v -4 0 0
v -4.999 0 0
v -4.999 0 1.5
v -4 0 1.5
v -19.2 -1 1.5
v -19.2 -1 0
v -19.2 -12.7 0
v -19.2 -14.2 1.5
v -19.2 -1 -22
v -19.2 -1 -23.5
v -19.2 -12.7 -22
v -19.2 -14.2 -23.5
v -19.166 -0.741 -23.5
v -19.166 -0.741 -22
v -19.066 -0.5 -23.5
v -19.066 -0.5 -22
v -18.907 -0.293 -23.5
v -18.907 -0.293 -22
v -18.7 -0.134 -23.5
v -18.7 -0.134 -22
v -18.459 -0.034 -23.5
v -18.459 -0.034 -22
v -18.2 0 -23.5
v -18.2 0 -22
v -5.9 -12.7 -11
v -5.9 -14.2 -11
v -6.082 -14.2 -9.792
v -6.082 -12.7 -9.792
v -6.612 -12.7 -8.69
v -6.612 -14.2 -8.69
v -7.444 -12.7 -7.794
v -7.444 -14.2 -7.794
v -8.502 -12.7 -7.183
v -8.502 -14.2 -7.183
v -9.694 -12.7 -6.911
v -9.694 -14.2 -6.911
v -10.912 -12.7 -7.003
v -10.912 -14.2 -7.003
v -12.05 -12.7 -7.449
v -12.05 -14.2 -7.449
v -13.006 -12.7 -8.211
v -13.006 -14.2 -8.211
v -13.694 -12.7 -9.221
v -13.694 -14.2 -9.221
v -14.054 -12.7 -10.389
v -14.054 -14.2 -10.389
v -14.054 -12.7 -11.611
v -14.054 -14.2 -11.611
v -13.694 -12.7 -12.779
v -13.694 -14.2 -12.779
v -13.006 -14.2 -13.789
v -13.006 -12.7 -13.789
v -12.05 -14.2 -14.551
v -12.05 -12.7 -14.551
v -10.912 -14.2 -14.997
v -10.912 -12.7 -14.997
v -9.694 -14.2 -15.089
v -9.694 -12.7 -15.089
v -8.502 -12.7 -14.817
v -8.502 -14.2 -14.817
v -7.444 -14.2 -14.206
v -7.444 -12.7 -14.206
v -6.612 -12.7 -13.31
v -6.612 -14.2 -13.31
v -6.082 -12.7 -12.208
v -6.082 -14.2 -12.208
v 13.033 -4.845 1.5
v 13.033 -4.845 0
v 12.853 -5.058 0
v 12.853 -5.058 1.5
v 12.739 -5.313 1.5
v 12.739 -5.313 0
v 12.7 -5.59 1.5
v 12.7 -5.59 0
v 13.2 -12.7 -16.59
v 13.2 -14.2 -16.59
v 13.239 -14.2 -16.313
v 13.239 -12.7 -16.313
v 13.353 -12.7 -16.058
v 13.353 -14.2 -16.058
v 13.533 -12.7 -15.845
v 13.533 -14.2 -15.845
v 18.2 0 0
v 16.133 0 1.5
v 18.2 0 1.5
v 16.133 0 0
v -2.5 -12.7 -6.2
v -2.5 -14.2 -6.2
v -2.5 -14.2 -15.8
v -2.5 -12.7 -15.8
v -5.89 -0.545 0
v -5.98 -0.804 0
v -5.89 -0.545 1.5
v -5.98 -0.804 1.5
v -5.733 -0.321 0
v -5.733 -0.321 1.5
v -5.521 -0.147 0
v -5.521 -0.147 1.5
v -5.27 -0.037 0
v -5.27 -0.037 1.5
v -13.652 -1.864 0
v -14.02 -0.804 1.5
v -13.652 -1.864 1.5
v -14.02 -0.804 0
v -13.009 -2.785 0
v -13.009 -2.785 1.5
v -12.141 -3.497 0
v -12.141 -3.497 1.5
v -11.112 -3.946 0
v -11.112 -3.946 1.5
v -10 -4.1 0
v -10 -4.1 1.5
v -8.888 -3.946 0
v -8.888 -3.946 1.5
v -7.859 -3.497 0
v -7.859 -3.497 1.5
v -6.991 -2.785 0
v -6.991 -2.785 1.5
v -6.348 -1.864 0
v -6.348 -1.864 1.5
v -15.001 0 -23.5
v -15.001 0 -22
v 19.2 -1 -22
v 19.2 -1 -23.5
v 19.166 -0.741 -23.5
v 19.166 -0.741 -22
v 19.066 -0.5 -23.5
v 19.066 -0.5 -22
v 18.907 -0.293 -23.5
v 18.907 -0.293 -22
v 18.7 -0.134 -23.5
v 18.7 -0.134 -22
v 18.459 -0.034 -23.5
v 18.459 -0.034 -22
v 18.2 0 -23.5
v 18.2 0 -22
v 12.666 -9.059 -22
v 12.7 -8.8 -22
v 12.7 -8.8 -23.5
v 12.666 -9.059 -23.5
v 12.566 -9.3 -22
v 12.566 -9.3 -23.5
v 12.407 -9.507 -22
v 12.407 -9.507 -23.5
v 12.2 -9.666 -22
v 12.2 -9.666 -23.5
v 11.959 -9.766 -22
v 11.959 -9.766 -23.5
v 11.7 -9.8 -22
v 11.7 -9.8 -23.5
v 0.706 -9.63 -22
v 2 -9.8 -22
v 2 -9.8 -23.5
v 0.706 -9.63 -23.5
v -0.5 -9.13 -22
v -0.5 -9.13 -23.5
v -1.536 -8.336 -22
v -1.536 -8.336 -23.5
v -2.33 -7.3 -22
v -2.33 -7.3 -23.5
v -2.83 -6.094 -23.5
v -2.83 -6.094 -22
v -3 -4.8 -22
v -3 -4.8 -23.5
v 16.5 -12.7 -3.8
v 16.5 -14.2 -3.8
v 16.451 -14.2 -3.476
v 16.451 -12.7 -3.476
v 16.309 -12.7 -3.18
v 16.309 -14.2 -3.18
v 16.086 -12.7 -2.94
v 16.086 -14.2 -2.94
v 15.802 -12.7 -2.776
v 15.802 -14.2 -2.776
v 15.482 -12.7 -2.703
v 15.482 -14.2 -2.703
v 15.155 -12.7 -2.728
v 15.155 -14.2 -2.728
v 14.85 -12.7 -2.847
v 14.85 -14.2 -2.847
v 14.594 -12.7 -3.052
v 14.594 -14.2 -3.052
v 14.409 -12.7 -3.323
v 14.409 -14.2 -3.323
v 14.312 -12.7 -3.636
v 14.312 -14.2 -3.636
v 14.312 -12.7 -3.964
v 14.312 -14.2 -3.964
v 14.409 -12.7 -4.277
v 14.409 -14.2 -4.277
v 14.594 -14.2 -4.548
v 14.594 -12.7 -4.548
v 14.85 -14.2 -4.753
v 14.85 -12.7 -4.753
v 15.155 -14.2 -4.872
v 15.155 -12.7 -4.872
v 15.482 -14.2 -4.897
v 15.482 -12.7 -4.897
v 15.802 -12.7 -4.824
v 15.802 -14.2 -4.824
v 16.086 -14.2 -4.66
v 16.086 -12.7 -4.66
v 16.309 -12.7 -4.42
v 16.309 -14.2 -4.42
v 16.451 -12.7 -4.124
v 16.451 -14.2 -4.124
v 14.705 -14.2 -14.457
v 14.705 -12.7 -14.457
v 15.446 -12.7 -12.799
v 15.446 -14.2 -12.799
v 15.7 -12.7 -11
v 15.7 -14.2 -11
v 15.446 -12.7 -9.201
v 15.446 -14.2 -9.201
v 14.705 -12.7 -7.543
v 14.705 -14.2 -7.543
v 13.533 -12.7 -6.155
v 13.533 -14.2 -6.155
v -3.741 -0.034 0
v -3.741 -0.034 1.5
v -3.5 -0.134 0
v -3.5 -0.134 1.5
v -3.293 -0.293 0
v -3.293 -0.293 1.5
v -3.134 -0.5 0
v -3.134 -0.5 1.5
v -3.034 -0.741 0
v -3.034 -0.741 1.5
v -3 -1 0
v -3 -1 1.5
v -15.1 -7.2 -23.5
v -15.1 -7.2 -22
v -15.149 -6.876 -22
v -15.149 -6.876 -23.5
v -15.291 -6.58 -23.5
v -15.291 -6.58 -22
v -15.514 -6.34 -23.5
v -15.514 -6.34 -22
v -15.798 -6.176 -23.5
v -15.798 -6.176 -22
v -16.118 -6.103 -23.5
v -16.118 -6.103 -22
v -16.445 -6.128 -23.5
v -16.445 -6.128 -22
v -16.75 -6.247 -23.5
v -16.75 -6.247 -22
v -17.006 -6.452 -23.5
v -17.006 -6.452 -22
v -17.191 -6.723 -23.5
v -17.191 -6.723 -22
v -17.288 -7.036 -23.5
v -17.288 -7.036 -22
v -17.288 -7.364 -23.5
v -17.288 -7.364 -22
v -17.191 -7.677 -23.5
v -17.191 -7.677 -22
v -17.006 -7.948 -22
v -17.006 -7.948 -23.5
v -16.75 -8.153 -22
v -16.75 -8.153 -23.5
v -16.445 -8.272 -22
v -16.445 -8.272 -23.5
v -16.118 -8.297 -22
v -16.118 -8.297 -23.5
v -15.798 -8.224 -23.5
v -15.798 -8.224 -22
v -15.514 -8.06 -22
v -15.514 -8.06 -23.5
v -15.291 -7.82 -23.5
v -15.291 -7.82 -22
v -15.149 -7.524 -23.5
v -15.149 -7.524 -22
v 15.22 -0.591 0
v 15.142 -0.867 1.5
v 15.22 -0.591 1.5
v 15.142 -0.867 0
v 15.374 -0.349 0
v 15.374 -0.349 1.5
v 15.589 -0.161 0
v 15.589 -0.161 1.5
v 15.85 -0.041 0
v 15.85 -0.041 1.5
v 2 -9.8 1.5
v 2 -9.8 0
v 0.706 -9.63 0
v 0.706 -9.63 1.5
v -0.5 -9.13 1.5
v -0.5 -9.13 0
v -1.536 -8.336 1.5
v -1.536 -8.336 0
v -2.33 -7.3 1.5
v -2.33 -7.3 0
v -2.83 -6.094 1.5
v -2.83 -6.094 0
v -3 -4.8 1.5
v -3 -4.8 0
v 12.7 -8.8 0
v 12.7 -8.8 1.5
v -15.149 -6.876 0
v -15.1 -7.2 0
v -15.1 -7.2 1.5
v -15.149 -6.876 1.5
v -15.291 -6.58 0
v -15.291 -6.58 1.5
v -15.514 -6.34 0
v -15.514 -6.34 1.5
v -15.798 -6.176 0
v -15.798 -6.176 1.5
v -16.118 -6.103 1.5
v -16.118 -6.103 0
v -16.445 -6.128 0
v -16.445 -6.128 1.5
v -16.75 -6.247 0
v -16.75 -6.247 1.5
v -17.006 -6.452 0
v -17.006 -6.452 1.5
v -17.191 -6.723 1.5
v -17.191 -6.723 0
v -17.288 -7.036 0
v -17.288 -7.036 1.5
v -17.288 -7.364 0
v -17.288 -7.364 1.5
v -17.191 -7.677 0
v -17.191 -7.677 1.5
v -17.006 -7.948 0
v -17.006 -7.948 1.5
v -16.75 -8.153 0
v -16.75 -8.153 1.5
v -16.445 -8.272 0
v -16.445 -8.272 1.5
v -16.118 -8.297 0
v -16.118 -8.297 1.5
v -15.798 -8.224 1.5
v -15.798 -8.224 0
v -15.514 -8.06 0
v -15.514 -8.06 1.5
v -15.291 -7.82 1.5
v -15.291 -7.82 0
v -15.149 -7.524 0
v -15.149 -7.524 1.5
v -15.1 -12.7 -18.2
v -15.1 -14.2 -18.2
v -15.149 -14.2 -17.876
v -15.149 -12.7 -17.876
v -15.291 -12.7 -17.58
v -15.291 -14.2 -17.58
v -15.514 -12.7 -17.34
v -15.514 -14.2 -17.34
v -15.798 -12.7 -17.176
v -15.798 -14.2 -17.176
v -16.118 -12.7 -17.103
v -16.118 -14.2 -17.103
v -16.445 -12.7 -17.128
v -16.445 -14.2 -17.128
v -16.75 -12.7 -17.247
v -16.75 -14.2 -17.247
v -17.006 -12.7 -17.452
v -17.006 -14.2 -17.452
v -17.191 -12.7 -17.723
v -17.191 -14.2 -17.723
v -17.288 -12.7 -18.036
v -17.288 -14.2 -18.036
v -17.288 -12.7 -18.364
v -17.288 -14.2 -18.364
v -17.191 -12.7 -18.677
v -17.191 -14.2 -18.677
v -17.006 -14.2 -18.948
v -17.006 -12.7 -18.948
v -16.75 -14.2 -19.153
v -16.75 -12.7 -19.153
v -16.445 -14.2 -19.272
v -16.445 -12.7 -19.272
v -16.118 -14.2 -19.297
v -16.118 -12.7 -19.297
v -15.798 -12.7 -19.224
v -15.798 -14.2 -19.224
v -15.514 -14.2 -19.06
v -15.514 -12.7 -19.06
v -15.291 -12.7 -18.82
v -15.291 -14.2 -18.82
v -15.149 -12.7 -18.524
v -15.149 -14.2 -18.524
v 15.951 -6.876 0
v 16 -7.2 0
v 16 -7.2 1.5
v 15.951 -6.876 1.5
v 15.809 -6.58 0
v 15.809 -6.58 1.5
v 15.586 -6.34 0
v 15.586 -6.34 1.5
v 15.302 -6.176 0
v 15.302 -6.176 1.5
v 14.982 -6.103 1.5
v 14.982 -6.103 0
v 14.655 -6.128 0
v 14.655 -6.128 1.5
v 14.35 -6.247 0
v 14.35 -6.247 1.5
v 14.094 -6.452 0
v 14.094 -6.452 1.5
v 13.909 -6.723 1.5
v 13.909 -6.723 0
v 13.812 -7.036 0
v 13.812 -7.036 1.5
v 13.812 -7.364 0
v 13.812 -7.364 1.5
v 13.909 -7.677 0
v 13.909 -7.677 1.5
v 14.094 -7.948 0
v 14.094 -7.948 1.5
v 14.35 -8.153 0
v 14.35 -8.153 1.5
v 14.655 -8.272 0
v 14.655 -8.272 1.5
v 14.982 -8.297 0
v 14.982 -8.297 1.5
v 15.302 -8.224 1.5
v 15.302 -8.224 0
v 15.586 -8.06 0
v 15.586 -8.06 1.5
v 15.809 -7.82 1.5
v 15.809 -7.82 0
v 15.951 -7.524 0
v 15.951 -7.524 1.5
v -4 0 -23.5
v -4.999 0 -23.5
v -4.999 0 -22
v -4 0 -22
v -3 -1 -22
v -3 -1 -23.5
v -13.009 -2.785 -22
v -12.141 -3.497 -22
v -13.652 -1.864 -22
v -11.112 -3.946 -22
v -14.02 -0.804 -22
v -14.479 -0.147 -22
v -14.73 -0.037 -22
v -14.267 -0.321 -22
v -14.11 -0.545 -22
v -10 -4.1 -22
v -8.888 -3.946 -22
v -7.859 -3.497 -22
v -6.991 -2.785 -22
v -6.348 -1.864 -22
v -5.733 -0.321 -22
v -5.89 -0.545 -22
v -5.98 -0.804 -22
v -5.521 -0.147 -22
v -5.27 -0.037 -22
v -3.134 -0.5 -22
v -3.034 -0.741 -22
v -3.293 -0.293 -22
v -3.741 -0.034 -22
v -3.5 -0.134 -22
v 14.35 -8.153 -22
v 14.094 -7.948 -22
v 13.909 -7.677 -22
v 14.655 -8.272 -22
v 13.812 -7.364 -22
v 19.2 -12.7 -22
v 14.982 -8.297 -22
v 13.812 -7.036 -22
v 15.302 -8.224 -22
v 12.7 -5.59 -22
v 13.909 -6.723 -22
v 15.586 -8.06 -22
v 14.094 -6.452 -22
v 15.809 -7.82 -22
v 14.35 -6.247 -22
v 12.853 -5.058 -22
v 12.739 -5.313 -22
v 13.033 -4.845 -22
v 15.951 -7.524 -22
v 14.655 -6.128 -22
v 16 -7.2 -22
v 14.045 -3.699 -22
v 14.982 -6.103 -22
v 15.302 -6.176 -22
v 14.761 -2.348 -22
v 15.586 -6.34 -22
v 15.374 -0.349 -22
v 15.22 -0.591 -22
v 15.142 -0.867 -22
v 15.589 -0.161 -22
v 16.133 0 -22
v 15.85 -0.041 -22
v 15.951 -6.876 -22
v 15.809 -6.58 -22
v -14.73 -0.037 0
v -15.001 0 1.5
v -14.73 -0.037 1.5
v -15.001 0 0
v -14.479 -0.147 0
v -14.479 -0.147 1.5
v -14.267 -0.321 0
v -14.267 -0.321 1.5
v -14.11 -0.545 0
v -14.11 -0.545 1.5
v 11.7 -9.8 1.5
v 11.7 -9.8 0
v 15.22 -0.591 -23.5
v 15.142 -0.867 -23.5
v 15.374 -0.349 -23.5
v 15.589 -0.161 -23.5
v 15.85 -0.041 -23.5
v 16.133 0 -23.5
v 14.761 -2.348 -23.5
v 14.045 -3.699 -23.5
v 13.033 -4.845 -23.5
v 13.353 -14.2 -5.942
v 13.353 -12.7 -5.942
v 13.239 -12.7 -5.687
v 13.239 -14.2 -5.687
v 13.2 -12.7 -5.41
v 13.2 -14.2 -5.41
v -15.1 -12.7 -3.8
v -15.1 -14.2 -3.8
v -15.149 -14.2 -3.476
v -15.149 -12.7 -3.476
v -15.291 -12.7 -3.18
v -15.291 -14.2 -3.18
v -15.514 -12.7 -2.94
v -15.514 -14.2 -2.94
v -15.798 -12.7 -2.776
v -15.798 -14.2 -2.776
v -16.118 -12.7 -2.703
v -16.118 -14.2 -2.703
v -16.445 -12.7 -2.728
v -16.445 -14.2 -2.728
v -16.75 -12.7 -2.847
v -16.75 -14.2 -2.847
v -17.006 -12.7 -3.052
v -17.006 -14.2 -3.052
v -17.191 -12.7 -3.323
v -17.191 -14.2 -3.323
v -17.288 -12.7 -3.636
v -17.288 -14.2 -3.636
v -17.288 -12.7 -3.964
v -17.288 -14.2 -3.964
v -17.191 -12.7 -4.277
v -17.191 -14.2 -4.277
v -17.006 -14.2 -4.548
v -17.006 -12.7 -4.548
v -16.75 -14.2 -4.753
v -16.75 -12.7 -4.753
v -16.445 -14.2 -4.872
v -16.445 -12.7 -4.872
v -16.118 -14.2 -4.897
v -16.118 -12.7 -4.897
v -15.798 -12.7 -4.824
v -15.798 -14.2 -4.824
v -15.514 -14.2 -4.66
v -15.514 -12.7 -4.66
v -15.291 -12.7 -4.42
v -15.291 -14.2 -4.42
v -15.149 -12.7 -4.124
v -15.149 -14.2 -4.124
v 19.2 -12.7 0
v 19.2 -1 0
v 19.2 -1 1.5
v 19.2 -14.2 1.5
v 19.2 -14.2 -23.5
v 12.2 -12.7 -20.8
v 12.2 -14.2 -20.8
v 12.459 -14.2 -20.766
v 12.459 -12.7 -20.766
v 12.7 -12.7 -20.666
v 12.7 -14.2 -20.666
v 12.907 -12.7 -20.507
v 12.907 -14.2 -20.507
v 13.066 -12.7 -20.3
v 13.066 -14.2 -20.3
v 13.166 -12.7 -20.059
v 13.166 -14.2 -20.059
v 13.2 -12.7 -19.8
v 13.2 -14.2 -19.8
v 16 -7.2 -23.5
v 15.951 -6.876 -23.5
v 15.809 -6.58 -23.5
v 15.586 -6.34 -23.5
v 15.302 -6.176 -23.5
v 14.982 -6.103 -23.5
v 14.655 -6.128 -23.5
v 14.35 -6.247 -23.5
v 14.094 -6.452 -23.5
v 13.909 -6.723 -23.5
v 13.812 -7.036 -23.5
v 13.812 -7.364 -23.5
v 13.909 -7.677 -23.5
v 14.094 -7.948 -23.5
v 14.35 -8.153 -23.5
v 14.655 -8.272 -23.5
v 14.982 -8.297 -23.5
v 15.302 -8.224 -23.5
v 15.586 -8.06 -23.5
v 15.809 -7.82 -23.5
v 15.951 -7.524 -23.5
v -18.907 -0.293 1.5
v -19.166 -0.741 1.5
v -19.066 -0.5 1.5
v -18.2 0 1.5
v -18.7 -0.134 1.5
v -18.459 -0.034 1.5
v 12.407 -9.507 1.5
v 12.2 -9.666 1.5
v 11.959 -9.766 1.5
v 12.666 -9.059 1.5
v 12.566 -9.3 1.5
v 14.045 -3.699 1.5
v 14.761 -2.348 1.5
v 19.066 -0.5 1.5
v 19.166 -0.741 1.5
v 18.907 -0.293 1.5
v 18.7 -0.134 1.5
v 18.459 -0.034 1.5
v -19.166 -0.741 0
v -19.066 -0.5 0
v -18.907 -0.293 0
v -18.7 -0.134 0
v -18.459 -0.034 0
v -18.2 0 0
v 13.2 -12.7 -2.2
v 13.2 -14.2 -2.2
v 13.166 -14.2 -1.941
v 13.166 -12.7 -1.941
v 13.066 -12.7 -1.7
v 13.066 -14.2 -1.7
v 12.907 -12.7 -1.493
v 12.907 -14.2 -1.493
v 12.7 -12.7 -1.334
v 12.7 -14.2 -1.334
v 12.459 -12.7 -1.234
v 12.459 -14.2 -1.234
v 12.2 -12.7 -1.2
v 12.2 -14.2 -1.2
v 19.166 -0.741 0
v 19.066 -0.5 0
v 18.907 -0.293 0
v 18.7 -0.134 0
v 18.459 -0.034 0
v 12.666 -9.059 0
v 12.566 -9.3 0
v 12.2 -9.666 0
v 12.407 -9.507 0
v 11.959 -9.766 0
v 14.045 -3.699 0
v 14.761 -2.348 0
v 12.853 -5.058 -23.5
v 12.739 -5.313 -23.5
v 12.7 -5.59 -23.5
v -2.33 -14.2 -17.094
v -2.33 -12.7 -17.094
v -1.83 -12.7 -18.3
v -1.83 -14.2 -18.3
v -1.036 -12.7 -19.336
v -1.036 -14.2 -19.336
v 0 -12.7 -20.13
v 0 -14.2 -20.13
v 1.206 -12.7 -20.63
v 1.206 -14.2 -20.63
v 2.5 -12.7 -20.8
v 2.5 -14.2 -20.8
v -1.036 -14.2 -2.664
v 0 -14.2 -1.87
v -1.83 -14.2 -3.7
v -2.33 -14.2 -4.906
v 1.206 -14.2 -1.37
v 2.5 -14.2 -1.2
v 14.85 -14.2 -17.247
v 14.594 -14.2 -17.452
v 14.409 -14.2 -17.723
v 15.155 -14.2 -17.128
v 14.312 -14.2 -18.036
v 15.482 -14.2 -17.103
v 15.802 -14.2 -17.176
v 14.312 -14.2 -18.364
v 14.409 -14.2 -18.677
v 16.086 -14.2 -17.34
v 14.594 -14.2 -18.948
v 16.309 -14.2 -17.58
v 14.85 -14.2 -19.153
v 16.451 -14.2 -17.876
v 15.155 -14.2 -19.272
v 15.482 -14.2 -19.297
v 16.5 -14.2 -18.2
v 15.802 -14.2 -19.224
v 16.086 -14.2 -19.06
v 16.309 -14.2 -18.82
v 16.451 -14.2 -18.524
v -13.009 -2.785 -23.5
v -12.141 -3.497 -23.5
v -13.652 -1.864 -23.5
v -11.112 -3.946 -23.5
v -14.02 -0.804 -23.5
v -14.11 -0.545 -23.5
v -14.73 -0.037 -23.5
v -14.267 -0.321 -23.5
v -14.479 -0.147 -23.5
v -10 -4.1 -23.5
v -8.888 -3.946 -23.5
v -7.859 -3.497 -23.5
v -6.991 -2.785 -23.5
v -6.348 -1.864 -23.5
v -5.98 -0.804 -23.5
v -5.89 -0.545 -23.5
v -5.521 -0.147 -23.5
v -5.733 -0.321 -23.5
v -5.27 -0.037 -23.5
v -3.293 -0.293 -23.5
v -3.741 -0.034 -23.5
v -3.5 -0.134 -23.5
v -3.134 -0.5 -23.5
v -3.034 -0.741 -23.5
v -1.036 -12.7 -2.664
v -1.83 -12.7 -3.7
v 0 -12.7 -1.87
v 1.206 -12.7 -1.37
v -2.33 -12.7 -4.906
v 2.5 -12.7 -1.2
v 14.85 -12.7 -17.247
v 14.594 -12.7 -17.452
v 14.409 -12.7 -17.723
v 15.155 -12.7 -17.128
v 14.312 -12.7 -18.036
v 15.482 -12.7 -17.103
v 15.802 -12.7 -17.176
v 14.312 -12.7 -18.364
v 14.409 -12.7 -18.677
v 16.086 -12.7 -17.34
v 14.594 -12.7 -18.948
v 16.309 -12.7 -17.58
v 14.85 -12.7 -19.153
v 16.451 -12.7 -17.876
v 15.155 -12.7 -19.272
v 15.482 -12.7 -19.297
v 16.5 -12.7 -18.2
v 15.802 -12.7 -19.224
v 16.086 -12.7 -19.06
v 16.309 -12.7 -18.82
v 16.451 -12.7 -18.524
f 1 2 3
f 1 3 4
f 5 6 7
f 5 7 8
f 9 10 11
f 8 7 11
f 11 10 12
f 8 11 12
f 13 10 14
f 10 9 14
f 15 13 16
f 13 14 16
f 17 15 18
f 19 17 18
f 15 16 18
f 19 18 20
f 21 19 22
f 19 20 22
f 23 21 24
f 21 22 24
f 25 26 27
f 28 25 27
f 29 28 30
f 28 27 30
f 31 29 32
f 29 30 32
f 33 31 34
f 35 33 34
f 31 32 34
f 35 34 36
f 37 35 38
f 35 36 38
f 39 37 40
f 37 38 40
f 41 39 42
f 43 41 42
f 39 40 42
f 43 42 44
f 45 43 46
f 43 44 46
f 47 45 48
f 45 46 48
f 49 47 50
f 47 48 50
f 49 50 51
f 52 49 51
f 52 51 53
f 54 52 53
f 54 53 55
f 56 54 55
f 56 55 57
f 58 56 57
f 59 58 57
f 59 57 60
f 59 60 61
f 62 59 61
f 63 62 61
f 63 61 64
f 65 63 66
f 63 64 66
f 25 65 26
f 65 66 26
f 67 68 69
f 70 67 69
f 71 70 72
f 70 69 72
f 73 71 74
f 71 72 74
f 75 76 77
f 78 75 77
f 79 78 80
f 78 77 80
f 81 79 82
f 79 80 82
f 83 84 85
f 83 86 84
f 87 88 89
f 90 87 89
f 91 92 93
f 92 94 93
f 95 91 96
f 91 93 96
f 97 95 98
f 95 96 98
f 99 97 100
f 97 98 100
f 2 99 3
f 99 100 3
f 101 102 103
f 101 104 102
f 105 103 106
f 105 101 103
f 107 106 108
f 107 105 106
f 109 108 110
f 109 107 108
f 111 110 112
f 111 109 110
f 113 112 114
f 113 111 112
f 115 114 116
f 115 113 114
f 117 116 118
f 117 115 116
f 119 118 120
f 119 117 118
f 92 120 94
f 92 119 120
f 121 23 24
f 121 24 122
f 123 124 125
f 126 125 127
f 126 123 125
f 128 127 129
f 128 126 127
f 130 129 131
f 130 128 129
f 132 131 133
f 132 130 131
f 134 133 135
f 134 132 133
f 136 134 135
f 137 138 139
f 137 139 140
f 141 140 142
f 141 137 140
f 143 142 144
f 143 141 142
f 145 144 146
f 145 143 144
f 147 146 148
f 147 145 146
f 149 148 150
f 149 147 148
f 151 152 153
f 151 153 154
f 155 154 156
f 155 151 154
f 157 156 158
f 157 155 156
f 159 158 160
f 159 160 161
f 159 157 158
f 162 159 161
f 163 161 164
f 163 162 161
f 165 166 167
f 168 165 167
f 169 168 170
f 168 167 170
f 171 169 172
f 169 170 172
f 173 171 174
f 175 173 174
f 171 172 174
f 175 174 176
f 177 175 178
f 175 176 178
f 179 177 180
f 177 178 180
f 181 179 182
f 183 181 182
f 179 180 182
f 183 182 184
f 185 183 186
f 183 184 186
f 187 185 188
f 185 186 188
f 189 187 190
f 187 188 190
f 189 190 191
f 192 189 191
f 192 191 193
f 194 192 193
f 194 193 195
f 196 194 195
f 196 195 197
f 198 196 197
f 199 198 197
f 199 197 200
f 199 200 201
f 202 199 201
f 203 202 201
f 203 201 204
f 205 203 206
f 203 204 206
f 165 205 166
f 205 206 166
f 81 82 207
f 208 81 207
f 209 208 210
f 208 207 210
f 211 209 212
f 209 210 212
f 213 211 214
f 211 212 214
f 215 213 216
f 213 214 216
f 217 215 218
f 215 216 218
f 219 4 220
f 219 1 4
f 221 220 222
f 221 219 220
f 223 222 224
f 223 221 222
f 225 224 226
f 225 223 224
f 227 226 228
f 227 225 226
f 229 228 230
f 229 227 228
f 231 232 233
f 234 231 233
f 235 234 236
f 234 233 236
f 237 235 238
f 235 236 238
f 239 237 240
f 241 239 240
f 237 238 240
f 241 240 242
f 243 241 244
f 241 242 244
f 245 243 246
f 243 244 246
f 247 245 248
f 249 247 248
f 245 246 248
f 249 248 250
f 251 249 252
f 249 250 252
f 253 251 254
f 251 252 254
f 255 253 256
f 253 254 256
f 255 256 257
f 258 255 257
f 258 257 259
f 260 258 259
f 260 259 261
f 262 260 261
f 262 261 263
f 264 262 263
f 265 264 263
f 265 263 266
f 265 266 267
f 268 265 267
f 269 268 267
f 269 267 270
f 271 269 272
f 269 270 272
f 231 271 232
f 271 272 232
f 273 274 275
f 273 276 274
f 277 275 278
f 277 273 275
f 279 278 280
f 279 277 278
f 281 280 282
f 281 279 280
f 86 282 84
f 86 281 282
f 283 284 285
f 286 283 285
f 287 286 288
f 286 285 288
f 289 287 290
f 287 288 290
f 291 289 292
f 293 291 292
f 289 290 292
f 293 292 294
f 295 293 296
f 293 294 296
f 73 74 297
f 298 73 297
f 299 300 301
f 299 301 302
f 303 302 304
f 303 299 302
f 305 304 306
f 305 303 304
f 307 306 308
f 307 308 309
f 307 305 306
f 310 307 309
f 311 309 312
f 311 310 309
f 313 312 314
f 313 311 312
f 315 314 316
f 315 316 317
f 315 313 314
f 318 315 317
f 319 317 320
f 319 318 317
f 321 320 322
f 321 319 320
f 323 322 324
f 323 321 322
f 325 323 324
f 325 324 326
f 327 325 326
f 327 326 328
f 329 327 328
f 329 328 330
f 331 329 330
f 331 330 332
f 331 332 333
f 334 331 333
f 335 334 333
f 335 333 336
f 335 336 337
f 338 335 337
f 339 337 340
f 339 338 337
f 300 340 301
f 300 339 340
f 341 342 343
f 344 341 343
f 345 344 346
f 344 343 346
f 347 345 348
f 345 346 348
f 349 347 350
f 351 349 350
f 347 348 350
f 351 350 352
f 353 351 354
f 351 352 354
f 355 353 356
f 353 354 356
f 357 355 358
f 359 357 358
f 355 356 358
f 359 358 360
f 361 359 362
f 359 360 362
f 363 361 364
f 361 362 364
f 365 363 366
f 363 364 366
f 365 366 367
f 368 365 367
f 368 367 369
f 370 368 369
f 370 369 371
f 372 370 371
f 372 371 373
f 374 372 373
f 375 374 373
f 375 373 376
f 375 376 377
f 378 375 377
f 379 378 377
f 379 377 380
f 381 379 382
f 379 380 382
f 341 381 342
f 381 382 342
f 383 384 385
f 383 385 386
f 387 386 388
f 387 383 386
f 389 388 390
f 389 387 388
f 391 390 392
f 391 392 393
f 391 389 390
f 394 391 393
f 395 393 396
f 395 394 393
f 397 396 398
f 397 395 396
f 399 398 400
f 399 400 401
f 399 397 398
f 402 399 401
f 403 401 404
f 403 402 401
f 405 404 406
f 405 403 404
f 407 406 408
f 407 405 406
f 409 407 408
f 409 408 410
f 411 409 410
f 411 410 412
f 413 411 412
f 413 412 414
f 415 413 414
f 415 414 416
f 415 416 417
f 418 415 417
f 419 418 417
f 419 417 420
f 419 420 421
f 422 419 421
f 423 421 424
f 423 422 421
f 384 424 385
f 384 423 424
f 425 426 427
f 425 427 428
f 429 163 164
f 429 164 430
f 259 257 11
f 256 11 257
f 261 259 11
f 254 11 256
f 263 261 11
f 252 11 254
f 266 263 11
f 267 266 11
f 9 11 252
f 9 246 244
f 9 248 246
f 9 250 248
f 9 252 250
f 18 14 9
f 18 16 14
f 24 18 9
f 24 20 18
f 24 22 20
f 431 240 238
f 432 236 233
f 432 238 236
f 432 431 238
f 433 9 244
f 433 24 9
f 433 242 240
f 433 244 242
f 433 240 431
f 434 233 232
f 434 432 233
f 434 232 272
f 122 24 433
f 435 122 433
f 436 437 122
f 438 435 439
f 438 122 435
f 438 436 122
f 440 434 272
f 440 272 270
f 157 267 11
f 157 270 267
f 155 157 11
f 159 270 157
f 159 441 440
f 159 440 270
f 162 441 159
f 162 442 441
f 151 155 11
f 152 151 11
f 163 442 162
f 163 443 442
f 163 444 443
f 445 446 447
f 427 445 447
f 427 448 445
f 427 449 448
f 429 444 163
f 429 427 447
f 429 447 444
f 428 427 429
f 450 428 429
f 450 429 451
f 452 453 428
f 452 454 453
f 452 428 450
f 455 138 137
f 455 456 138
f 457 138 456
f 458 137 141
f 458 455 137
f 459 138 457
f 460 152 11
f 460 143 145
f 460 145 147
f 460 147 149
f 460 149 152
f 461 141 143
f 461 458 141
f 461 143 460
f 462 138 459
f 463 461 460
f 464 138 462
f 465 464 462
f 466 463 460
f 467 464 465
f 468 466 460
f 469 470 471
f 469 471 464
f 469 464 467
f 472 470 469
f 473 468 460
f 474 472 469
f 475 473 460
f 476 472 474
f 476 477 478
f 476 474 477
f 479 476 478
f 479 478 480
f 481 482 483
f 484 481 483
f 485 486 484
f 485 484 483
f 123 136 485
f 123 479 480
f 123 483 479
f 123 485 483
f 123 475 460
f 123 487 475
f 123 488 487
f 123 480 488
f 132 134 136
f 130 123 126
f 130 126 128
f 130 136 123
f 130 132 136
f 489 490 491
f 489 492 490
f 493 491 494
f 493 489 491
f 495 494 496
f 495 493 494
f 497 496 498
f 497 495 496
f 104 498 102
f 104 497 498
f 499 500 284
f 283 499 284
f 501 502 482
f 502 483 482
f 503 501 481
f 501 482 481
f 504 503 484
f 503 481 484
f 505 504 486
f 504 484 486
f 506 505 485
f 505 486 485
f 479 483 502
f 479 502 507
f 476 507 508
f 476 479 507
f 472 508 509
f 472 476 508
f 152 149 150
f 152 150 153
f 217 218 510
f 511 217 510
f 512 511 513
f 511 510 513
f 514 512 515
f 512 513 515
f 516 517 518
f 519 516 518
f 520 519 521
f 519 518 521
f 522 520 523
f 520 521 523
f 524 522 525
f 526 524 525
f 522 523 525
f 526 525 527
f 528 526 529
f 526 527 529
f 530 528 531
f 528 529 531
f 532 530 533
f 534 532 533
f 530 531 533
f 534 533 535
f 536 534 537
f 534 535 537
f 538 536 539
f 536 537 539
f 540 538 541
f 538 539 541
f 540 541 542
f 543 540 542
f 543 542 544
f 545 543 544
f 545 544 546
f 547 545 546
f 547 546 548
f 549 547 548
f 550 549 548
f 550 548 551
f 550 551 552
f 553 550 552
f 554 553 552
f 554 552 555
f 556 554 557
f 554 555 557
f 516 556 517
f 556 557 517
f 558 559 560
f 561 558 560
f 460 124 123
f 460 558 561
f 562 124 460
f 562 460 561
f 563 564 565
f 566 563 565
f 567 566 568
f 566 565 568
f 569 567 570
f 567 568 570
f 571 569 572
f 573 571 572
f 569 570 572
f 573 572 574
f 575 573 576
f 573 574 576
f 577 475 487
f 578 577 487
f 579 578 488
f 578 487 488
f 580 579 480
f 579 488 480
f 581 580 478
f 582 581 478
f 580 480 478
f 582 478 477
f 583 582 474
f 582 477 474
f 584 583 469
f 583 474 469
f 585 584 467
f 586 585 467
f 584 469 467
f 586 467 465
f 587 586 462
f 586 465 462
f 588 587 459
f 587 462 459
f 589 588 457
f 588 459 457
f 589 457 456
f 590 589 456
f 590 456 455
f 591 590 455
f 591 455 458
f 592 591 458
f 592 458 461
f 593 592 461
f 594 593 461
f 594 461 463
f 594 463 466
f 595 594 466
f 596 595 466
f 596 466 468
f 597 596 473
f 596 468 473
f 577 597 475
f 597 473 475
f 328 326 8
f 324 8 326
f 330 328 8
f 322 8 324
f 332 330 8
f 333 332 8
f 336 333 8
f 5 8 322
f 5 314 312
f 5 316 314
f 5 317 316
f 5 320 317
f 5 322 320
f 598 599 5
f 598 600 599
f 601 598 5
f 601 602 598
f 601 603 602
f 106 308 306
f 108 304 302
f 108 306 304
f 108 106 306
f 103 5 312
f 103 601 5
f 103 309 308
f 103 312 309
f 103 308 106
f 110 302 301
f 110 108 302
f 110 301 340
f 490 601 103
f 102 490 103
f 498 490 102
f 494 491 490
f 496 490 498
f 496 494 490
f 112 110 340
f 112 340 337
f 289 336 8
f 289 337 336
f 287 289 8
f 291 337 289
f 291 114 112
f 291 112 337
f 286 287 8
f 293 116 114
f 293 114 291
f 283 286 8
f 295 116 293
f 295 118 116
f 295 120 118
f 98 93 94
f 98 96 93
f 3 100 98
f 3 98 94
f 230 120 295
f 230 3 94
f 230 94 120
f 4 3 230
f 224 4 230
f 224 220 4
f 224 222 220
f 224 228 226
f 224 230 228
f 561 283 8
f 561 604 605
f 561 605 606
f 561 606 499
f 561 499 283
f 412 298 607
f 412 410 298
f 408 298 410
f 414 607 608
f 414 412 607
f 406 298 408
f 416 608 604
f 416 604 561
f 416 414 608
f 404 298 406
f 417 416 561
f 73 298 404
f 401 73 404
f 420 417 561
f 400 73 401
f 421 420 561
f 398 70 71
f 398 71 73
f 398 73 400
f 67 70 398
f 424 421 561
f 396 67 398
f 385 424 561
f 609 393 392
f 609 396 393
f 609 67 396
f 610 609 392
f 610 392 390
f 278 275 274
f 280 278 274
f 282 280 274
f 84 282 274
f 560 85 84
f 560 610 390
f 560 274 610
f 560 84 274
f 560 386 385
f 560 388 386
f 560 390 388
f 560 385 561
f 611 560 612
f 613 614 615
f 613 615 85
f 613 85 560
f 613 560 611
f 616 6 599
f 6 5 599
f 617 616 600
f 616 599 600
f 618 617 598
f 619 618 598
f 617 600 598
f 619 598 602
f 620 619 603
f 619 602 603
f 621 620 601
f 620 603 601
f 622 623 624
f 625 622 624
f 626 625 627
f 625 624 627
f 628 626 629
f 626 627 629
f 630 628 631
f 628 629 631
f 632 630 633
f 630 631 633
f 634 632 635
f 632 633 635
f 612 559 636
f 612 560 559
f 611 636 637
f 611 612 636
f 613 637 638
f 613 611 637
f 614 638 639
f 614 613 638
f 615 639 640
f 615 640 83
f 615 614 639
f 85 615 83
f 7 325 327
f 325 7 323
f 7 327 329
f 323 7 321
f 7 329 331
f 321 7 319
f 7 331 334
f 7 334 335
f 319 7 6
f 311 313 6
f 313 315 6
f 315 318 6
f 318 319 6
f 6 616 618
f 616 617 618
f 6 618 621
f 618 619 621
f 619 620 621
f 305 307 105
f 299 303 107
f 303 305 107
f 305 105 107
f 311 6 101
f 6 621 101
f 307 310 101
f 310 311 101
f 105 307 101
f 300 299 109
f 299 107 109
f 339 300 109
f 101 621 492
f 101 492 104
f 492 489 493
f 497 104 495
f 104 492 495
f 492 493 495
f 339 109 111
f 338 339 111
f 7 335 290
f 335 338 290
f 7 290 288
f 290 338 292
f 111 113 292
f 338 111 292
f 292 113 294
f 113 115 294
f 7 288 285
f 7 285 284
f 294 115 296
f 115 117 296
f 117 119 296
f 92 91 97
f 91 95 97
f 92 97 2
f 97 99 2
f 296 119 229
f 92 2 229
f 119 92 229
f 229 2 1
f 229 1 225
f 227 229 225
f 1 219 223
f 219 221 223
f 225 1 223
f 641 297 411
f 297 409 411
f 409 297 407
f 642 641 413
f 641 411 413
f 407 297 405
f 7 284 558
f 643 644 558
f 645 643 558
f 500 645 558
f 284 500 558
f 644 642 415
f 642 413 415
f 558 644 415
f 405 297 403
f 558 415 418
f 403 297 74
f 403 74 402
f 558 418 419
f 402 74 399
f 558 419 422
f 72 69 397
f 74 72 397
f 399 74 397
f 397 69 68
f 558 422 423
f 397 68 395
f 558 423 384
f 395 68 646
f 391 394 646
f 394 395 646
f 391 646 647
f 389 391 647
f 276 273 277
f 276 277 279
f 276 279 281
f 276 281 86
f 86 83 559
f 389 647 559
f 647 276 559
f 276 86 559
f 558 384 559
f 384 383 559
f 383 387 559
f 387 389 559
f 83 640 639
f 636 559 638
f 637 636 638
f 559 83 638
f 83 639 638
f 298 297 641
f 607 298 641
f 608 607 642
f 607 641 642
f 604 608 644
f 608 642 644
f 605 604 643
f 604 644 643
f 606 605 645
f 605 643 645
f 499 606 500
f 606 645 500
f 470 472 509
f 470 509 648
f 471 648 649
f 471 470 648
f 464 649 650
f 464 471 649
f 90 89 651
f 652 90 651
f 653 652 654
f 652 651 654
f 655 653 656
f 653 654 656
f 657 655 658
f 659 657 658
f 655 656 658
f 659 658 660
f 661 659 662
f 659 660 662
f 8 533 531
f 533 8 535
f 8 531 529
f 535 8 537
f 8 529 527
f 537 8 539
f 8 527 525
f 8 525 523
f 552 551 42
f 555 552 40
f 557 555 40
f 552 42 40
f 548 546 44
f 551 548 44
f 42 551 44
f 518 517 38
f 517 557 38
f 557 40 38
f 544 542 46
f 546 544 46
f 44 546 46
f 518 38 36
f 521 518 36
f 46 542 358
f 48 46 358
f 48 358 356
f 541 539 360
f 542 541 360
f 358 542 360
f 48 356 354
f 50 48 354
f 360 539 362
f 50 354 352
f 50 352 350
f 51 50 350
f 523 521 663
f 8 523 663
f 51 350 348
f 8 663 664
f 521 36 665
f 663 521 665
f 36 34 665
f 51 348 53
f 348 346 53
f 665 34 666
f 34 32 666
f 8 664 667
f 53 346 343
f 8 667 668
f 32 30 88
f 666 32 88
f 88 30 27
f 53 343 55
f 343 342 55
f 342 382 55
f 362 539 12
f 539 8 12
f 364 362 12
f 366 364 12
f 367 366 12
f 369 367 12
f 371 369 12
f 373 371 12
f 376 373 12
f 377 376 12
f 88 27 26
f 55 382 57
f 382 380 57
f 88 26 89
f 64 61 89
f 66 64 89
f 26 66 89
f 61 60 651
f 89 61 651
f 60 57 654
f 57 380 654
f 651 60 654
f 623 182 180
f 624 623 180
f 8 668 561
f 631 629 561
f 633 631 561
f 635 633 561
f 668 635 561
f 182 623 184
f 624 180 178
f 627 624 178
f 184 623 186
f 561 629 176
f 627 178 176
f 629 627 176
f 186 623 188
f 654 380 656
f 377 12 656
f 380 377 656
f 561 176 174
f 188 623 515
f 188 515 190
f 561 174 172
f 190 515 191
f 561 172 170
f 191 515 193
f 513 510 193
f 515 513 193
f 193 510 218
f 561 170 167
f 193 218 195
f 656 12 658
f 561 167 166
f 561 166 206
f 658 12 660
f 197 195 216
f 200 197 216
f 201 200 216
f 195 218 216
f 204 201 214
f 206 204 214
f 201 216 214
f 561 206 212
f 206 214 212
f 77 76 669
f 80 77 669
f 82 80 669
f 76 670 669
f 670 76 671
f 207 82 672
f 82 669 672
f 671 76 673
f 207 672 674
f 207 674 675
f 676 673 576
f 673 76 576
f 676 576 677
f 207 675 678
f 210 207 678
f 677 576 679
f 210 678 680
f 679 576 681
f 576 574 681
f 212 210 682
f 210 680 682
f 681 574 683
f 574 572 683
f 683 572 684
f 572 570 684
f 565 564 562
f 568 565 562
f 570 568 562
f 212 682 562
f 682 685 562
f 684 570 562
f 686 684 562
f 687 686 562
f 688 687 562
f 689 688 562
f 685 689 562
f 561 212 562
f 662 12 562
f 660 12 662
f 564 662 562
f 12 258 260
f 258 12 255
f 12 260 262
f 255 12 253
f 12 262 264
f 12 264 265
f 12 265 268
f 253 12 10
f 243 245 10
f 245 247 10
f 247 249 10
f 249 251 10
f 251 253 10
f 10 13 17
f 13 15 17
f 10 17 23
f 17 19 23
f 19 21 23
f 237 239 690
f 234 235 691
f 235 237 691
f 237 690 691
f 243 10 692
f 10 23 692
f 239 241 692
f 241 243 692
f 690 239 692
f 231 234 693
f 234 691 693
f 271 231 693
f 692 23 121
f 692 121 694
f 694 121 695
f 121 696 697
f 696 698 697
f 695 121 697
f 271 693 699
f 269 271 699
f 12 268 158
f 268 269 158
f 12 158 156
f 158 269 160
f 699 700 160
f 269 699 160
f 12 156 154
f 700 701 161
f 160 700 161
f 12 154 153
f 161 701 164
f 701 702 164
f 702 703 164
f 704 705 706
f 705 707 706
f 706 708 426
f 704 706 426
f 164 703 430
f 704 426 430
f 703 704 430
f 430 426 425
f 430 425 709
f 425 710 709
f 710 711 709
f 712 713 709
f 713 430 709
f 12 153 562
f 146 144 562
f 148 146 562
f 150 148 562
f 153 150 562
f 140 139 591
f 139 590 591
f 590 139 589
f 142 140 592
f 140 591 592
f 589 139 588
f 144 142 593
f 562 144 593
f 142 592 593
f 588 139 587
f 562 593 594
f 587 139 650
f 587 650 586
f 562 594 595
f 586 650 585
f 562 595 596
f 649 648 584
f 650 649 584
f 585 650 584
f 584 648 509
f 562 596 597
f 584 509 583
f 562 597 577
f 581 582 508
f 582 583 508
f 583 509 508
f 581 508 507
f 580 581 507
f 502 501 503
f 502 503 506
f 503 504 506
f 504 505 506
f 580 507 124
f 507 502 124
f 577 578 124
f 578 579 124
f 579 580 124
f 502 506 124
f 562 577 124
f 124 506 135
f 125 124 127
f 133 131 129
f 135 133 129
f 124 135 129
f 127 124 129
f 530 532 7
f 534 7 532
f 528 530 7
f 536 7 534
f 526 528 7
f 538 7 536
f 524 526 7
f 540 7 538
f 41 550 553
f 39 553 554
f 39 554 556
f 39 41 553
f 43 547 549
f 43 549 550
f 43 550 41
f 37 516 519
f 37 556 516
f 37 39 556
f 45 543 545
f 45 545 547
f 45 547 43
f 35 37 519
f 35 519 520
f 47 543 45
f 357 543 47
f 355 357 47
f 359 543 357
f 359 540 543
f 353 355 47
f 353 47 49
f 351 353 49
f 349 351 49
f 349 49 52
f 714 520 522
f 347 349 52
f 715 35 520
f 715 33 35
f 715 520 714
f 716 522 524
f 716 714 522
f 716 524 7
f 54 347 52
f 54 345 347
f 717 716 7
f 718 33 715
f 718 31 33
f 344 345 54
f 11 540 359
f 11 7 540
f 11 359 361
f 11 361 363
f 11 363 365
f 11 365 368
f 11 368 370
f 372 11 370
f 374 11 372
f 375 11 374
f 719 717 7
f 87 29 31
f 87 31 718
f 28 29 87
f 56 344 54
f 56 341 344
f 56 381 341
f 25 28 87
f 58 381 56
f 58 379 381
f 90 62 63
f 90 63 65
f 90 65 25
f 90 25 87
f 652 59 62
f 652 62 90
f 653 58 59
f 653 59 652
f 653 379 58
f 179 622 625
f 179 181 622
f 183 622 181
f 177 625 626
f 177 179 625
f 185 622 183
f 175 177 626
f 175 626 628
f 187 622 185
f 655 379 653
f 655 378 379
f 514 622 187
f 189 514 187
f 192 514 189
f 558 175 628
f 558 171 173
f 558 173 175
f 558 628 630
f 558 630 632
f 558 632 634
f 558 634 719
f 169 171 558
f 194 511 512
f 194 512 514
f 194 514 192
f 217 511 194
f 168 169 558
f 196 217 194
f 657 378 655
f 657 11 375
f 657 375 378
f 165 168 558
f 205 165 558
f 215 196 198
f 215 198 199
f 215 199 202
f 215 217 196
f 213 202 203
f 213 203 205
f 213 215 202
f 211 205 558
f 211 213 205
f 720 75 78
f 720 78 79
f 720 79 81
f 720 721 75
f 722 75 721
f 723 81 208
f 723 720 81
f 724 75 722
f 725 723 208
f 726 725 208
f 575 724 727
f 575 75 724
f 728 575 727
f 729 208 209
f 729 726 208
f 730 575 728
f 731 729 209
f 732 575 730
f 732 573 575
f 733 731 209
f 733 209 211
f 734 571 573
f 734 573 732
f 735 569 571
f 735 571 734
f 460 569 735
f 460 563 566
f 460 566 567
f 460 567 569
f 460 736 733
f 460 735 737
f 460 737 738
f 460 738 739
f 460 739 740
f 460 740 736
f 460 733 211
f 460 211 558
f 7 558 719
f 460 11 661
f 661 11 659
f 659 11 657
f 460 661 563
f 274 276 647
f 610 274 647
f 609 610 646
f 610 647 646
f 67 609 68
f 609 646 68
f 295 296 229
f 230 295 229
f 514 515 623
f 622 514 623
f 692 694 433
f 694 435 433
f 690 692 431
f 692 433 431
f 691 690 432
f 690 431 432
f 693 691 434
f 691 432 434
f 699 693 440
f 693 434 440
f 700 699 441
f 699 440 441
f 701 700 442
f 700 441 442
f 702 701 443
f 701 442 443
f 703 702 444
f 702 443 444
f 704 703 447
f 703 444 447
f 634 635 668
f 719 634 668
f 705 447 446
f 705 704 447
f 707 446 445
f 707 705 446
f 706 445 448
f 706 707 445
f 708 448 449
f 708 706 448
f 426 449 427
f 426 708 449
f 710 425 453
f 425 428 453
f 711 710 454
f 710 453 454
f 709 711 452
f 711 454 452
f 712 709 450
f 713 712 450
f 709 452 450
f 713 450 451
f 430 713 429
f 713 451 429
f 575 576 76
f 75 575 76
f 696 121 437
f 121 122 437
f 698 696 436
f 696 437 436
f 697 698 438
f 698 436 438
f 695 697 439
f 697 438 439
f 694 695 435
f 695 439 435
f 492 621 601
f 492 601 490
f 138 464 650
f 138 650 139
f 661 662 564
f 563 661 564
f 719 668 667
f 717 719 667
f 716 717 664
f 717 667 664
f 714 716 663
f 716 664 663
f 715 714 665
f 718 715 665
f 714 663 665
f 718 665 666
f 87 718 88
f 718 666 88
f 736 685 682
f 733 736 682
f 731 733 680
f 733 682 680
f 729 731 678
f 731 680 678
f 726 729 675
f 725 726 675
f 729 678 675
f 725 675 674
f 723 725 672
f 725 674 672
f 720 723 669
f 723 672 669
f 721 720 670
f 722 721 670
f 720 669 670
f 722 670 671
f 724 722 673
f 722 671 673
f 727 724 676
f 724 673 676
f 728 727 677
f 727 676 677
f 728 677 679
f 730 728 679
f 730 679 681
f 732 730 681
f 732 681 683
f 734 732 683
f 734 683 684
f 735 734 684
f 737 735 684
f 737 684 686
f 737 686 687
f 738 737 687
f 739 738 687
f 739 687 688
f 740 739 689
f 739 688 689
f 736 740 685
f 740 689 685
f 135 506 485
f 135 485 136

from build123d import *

# Parameters (mm, degrees)
F0_W     = 38.4
F0_H     = 28.4
F0_R     = 1.1
F0_R_2   = 4.1
F1_DEPTH = 1.5
F2_W     = 38.4
F2_H     = 1.5
F3_DEPTH = 11
F6_W     = 38.4
F6_H     = 14.2
F7_DEPTH = 25.001
F8_R     = 4.1
F8_R_2   = 1.1
F9_DEPTH = 1.5
F10_R    = 1


with BuildPart() as f1:
    # F0 (on Top) → F1 (new body)
    with BuildSketch(Plane.XY):
        Rectangle(F0_W, F0_H)
        with Locations((-16.2, -7.2)):
            Circle(F0_R, mode=Mode.SUBTRACT)
        with Locations((14.9, -7.2)):
            Circle(F0_R, mode=Mode.SUBTRACT)
        with Locations((-10, 0)):
            Circle(F0_R_2, mode=Mode.SUBTRACT)
        with Locations((-16.2, 7.2)):
            Circle(F0_R, mode=Mode.SUBTRACT)
        with BuildLine():
            ThreePointArc((-3, 4.8), (-1.5355339059, 8.3355339059), (2, 9.8))
            Line((2, 9.8), (11.7, 9.8))
            ThreePointArc((11.7, 9.8), (12.4071067812, 9.5071067812), (12.7, 8.8))
            Line((12.7, 8.8), (12.7, 5.5901699437))
            ThreePointArc((12.7, 5.5901699437), (12.7871290708, 5.1819216533), (13.0333333333, 4.8448139512))
            ThreePointArc((13.0333333333, 4.8448139512), (15.2, 0), (13.0333333333, -4.8448139512))
            ThreePointArc((13.0333333333, -4.8448139512), (12.7871290708, -5.1819216533), (12.7, -5.5901699437))
            Line((12.7, -5.5901699437), (12.7, -8.8))
            ThreePointArc((12.7, -8.8), (12.4071067812, -9.5071067812), (11.7, -9.8))
            Line((11.7, -9.8), (2, -9.8))
            ThreePointArc((2, -9.8), (-1.5355339059, -8.3355339059), (-3, -4.8))
            Line((-3, -4.8), (-3, 4.8))
        make_face(mode=Mode.SUBTRACT)
        with Locations((14.9, 7.2)):
            Circle(F0_R, mode=Mode.SUBTRACT)
    extrude(amount=F1_DEPTH)

    # F2 (on face) → F3 (join)
    with BuildSketch(Plane(origin=(0, 0, 0), x_dir=(1, 0, 0), z_dir=(0, 0, -1))):
        with Locations((0, 13.45)):
            Rectangle(F2_W, F2_H)
    extrude(amount=F3_DEPTH)

    # F5: F1 across plane


with BuildPart() as f1_1:
    add(f1.part)
    add(f1.part.mirror(Plane.XY.offset(-11)))

    # F6 (on face) → F7 (cut, through all)
    with BuildSketch(Plane(origin=(0, 0, -23.5), x_dir=(1, 0, 0), z_dir=(0, 0, -1))):
        with Locations((0, -7.1)):
            Rectangle(F6_W, F6_H)
    extrude(amount=-F7_DEPTH, mode=Mode.SUBTRACT)

    # F8 (on face) → F9 (cut, through all)
    with BuildSketch(Plane.XZ.offset(14.2)):
        with Locations((-10, -11)):
            Circle(F8_R)
        with Locations((-16.2, -3.8)):
            Circle(F8_R_2)
        with Locations((15.4, -3.8)):
            Circle(F8_R_2)
        with BuildLine():
            Line((12.2, -1.2), (2.5, -1.2))
            ThreePointArc((2.5, -1.2), (-1.0355339059, -2.6644660941), (-2.5, -6.2))
            Line((-2.5, -6.2), (-2.5, -15.8))
            ThreePointArc((-2.5, -15.8), (-1.0355339059, -19.3355339059), (2.5, -20.8))
            Line((2.5, -20.8), (12.2, -20.8))
            ThreePointArc((12.2, -20.8), (12.9071067812, -20.5071067812), (13.2, -19.8))
            Line((13.2, -19.8), (13.2, -16.5901699437))
            ThreePointArc((13.2, -16.5901699437), (13.2871290708, -16.1819216533), (13.5333333333, -15.8448139512))
            ThreePointArc((13.5333333333, -15.8448139512), (15.7, -11), (13.5333333333, -6.1551860488))
            ThreePointArc((13.5333333333, -6.1551860488), (13.2871290708, -5.8180783467), (13.2, -5.4098300563))
            Line((13.2, -5.4098300563), (13.2, -2.2))
            ThreePointArc((13.2, -2.2), (12.9071067812, -1.4928932188), (12.2, -1.2))
        make_face()
        with Locations((-16.2, -18.2)):
            Circle(F8_R_2)
        with Locations((15.4, -18.2)):
            Circle(F8_R_2)
    extrude(amount=-F9_DEPTH, mode=Mode.SUBTRACT)

    # F10
    f10_edges = [f1_1.edges().sort_by_distance(p)[0] for p in [
        (-19.2, 0, -22.75),
        (-19.2, 0, 0.75),
        (-5.9, 0, 0.75),
        (-14.1, 0, 0.75),
        (-5.9, 0, -22.75),
        (-14.1, 0, -22.75),
        (-3, 0, -22.75),
        (15.2, 0, -22.75),
        (15.2, 0, 0.75),
        (19.2, 0, -22.75),
        (19.2, 0, 0.75),
        (-3, 0, 0.75),
    ]]
    fillet(f10_edges, radius=F10_R)


solid = f1_1.part
